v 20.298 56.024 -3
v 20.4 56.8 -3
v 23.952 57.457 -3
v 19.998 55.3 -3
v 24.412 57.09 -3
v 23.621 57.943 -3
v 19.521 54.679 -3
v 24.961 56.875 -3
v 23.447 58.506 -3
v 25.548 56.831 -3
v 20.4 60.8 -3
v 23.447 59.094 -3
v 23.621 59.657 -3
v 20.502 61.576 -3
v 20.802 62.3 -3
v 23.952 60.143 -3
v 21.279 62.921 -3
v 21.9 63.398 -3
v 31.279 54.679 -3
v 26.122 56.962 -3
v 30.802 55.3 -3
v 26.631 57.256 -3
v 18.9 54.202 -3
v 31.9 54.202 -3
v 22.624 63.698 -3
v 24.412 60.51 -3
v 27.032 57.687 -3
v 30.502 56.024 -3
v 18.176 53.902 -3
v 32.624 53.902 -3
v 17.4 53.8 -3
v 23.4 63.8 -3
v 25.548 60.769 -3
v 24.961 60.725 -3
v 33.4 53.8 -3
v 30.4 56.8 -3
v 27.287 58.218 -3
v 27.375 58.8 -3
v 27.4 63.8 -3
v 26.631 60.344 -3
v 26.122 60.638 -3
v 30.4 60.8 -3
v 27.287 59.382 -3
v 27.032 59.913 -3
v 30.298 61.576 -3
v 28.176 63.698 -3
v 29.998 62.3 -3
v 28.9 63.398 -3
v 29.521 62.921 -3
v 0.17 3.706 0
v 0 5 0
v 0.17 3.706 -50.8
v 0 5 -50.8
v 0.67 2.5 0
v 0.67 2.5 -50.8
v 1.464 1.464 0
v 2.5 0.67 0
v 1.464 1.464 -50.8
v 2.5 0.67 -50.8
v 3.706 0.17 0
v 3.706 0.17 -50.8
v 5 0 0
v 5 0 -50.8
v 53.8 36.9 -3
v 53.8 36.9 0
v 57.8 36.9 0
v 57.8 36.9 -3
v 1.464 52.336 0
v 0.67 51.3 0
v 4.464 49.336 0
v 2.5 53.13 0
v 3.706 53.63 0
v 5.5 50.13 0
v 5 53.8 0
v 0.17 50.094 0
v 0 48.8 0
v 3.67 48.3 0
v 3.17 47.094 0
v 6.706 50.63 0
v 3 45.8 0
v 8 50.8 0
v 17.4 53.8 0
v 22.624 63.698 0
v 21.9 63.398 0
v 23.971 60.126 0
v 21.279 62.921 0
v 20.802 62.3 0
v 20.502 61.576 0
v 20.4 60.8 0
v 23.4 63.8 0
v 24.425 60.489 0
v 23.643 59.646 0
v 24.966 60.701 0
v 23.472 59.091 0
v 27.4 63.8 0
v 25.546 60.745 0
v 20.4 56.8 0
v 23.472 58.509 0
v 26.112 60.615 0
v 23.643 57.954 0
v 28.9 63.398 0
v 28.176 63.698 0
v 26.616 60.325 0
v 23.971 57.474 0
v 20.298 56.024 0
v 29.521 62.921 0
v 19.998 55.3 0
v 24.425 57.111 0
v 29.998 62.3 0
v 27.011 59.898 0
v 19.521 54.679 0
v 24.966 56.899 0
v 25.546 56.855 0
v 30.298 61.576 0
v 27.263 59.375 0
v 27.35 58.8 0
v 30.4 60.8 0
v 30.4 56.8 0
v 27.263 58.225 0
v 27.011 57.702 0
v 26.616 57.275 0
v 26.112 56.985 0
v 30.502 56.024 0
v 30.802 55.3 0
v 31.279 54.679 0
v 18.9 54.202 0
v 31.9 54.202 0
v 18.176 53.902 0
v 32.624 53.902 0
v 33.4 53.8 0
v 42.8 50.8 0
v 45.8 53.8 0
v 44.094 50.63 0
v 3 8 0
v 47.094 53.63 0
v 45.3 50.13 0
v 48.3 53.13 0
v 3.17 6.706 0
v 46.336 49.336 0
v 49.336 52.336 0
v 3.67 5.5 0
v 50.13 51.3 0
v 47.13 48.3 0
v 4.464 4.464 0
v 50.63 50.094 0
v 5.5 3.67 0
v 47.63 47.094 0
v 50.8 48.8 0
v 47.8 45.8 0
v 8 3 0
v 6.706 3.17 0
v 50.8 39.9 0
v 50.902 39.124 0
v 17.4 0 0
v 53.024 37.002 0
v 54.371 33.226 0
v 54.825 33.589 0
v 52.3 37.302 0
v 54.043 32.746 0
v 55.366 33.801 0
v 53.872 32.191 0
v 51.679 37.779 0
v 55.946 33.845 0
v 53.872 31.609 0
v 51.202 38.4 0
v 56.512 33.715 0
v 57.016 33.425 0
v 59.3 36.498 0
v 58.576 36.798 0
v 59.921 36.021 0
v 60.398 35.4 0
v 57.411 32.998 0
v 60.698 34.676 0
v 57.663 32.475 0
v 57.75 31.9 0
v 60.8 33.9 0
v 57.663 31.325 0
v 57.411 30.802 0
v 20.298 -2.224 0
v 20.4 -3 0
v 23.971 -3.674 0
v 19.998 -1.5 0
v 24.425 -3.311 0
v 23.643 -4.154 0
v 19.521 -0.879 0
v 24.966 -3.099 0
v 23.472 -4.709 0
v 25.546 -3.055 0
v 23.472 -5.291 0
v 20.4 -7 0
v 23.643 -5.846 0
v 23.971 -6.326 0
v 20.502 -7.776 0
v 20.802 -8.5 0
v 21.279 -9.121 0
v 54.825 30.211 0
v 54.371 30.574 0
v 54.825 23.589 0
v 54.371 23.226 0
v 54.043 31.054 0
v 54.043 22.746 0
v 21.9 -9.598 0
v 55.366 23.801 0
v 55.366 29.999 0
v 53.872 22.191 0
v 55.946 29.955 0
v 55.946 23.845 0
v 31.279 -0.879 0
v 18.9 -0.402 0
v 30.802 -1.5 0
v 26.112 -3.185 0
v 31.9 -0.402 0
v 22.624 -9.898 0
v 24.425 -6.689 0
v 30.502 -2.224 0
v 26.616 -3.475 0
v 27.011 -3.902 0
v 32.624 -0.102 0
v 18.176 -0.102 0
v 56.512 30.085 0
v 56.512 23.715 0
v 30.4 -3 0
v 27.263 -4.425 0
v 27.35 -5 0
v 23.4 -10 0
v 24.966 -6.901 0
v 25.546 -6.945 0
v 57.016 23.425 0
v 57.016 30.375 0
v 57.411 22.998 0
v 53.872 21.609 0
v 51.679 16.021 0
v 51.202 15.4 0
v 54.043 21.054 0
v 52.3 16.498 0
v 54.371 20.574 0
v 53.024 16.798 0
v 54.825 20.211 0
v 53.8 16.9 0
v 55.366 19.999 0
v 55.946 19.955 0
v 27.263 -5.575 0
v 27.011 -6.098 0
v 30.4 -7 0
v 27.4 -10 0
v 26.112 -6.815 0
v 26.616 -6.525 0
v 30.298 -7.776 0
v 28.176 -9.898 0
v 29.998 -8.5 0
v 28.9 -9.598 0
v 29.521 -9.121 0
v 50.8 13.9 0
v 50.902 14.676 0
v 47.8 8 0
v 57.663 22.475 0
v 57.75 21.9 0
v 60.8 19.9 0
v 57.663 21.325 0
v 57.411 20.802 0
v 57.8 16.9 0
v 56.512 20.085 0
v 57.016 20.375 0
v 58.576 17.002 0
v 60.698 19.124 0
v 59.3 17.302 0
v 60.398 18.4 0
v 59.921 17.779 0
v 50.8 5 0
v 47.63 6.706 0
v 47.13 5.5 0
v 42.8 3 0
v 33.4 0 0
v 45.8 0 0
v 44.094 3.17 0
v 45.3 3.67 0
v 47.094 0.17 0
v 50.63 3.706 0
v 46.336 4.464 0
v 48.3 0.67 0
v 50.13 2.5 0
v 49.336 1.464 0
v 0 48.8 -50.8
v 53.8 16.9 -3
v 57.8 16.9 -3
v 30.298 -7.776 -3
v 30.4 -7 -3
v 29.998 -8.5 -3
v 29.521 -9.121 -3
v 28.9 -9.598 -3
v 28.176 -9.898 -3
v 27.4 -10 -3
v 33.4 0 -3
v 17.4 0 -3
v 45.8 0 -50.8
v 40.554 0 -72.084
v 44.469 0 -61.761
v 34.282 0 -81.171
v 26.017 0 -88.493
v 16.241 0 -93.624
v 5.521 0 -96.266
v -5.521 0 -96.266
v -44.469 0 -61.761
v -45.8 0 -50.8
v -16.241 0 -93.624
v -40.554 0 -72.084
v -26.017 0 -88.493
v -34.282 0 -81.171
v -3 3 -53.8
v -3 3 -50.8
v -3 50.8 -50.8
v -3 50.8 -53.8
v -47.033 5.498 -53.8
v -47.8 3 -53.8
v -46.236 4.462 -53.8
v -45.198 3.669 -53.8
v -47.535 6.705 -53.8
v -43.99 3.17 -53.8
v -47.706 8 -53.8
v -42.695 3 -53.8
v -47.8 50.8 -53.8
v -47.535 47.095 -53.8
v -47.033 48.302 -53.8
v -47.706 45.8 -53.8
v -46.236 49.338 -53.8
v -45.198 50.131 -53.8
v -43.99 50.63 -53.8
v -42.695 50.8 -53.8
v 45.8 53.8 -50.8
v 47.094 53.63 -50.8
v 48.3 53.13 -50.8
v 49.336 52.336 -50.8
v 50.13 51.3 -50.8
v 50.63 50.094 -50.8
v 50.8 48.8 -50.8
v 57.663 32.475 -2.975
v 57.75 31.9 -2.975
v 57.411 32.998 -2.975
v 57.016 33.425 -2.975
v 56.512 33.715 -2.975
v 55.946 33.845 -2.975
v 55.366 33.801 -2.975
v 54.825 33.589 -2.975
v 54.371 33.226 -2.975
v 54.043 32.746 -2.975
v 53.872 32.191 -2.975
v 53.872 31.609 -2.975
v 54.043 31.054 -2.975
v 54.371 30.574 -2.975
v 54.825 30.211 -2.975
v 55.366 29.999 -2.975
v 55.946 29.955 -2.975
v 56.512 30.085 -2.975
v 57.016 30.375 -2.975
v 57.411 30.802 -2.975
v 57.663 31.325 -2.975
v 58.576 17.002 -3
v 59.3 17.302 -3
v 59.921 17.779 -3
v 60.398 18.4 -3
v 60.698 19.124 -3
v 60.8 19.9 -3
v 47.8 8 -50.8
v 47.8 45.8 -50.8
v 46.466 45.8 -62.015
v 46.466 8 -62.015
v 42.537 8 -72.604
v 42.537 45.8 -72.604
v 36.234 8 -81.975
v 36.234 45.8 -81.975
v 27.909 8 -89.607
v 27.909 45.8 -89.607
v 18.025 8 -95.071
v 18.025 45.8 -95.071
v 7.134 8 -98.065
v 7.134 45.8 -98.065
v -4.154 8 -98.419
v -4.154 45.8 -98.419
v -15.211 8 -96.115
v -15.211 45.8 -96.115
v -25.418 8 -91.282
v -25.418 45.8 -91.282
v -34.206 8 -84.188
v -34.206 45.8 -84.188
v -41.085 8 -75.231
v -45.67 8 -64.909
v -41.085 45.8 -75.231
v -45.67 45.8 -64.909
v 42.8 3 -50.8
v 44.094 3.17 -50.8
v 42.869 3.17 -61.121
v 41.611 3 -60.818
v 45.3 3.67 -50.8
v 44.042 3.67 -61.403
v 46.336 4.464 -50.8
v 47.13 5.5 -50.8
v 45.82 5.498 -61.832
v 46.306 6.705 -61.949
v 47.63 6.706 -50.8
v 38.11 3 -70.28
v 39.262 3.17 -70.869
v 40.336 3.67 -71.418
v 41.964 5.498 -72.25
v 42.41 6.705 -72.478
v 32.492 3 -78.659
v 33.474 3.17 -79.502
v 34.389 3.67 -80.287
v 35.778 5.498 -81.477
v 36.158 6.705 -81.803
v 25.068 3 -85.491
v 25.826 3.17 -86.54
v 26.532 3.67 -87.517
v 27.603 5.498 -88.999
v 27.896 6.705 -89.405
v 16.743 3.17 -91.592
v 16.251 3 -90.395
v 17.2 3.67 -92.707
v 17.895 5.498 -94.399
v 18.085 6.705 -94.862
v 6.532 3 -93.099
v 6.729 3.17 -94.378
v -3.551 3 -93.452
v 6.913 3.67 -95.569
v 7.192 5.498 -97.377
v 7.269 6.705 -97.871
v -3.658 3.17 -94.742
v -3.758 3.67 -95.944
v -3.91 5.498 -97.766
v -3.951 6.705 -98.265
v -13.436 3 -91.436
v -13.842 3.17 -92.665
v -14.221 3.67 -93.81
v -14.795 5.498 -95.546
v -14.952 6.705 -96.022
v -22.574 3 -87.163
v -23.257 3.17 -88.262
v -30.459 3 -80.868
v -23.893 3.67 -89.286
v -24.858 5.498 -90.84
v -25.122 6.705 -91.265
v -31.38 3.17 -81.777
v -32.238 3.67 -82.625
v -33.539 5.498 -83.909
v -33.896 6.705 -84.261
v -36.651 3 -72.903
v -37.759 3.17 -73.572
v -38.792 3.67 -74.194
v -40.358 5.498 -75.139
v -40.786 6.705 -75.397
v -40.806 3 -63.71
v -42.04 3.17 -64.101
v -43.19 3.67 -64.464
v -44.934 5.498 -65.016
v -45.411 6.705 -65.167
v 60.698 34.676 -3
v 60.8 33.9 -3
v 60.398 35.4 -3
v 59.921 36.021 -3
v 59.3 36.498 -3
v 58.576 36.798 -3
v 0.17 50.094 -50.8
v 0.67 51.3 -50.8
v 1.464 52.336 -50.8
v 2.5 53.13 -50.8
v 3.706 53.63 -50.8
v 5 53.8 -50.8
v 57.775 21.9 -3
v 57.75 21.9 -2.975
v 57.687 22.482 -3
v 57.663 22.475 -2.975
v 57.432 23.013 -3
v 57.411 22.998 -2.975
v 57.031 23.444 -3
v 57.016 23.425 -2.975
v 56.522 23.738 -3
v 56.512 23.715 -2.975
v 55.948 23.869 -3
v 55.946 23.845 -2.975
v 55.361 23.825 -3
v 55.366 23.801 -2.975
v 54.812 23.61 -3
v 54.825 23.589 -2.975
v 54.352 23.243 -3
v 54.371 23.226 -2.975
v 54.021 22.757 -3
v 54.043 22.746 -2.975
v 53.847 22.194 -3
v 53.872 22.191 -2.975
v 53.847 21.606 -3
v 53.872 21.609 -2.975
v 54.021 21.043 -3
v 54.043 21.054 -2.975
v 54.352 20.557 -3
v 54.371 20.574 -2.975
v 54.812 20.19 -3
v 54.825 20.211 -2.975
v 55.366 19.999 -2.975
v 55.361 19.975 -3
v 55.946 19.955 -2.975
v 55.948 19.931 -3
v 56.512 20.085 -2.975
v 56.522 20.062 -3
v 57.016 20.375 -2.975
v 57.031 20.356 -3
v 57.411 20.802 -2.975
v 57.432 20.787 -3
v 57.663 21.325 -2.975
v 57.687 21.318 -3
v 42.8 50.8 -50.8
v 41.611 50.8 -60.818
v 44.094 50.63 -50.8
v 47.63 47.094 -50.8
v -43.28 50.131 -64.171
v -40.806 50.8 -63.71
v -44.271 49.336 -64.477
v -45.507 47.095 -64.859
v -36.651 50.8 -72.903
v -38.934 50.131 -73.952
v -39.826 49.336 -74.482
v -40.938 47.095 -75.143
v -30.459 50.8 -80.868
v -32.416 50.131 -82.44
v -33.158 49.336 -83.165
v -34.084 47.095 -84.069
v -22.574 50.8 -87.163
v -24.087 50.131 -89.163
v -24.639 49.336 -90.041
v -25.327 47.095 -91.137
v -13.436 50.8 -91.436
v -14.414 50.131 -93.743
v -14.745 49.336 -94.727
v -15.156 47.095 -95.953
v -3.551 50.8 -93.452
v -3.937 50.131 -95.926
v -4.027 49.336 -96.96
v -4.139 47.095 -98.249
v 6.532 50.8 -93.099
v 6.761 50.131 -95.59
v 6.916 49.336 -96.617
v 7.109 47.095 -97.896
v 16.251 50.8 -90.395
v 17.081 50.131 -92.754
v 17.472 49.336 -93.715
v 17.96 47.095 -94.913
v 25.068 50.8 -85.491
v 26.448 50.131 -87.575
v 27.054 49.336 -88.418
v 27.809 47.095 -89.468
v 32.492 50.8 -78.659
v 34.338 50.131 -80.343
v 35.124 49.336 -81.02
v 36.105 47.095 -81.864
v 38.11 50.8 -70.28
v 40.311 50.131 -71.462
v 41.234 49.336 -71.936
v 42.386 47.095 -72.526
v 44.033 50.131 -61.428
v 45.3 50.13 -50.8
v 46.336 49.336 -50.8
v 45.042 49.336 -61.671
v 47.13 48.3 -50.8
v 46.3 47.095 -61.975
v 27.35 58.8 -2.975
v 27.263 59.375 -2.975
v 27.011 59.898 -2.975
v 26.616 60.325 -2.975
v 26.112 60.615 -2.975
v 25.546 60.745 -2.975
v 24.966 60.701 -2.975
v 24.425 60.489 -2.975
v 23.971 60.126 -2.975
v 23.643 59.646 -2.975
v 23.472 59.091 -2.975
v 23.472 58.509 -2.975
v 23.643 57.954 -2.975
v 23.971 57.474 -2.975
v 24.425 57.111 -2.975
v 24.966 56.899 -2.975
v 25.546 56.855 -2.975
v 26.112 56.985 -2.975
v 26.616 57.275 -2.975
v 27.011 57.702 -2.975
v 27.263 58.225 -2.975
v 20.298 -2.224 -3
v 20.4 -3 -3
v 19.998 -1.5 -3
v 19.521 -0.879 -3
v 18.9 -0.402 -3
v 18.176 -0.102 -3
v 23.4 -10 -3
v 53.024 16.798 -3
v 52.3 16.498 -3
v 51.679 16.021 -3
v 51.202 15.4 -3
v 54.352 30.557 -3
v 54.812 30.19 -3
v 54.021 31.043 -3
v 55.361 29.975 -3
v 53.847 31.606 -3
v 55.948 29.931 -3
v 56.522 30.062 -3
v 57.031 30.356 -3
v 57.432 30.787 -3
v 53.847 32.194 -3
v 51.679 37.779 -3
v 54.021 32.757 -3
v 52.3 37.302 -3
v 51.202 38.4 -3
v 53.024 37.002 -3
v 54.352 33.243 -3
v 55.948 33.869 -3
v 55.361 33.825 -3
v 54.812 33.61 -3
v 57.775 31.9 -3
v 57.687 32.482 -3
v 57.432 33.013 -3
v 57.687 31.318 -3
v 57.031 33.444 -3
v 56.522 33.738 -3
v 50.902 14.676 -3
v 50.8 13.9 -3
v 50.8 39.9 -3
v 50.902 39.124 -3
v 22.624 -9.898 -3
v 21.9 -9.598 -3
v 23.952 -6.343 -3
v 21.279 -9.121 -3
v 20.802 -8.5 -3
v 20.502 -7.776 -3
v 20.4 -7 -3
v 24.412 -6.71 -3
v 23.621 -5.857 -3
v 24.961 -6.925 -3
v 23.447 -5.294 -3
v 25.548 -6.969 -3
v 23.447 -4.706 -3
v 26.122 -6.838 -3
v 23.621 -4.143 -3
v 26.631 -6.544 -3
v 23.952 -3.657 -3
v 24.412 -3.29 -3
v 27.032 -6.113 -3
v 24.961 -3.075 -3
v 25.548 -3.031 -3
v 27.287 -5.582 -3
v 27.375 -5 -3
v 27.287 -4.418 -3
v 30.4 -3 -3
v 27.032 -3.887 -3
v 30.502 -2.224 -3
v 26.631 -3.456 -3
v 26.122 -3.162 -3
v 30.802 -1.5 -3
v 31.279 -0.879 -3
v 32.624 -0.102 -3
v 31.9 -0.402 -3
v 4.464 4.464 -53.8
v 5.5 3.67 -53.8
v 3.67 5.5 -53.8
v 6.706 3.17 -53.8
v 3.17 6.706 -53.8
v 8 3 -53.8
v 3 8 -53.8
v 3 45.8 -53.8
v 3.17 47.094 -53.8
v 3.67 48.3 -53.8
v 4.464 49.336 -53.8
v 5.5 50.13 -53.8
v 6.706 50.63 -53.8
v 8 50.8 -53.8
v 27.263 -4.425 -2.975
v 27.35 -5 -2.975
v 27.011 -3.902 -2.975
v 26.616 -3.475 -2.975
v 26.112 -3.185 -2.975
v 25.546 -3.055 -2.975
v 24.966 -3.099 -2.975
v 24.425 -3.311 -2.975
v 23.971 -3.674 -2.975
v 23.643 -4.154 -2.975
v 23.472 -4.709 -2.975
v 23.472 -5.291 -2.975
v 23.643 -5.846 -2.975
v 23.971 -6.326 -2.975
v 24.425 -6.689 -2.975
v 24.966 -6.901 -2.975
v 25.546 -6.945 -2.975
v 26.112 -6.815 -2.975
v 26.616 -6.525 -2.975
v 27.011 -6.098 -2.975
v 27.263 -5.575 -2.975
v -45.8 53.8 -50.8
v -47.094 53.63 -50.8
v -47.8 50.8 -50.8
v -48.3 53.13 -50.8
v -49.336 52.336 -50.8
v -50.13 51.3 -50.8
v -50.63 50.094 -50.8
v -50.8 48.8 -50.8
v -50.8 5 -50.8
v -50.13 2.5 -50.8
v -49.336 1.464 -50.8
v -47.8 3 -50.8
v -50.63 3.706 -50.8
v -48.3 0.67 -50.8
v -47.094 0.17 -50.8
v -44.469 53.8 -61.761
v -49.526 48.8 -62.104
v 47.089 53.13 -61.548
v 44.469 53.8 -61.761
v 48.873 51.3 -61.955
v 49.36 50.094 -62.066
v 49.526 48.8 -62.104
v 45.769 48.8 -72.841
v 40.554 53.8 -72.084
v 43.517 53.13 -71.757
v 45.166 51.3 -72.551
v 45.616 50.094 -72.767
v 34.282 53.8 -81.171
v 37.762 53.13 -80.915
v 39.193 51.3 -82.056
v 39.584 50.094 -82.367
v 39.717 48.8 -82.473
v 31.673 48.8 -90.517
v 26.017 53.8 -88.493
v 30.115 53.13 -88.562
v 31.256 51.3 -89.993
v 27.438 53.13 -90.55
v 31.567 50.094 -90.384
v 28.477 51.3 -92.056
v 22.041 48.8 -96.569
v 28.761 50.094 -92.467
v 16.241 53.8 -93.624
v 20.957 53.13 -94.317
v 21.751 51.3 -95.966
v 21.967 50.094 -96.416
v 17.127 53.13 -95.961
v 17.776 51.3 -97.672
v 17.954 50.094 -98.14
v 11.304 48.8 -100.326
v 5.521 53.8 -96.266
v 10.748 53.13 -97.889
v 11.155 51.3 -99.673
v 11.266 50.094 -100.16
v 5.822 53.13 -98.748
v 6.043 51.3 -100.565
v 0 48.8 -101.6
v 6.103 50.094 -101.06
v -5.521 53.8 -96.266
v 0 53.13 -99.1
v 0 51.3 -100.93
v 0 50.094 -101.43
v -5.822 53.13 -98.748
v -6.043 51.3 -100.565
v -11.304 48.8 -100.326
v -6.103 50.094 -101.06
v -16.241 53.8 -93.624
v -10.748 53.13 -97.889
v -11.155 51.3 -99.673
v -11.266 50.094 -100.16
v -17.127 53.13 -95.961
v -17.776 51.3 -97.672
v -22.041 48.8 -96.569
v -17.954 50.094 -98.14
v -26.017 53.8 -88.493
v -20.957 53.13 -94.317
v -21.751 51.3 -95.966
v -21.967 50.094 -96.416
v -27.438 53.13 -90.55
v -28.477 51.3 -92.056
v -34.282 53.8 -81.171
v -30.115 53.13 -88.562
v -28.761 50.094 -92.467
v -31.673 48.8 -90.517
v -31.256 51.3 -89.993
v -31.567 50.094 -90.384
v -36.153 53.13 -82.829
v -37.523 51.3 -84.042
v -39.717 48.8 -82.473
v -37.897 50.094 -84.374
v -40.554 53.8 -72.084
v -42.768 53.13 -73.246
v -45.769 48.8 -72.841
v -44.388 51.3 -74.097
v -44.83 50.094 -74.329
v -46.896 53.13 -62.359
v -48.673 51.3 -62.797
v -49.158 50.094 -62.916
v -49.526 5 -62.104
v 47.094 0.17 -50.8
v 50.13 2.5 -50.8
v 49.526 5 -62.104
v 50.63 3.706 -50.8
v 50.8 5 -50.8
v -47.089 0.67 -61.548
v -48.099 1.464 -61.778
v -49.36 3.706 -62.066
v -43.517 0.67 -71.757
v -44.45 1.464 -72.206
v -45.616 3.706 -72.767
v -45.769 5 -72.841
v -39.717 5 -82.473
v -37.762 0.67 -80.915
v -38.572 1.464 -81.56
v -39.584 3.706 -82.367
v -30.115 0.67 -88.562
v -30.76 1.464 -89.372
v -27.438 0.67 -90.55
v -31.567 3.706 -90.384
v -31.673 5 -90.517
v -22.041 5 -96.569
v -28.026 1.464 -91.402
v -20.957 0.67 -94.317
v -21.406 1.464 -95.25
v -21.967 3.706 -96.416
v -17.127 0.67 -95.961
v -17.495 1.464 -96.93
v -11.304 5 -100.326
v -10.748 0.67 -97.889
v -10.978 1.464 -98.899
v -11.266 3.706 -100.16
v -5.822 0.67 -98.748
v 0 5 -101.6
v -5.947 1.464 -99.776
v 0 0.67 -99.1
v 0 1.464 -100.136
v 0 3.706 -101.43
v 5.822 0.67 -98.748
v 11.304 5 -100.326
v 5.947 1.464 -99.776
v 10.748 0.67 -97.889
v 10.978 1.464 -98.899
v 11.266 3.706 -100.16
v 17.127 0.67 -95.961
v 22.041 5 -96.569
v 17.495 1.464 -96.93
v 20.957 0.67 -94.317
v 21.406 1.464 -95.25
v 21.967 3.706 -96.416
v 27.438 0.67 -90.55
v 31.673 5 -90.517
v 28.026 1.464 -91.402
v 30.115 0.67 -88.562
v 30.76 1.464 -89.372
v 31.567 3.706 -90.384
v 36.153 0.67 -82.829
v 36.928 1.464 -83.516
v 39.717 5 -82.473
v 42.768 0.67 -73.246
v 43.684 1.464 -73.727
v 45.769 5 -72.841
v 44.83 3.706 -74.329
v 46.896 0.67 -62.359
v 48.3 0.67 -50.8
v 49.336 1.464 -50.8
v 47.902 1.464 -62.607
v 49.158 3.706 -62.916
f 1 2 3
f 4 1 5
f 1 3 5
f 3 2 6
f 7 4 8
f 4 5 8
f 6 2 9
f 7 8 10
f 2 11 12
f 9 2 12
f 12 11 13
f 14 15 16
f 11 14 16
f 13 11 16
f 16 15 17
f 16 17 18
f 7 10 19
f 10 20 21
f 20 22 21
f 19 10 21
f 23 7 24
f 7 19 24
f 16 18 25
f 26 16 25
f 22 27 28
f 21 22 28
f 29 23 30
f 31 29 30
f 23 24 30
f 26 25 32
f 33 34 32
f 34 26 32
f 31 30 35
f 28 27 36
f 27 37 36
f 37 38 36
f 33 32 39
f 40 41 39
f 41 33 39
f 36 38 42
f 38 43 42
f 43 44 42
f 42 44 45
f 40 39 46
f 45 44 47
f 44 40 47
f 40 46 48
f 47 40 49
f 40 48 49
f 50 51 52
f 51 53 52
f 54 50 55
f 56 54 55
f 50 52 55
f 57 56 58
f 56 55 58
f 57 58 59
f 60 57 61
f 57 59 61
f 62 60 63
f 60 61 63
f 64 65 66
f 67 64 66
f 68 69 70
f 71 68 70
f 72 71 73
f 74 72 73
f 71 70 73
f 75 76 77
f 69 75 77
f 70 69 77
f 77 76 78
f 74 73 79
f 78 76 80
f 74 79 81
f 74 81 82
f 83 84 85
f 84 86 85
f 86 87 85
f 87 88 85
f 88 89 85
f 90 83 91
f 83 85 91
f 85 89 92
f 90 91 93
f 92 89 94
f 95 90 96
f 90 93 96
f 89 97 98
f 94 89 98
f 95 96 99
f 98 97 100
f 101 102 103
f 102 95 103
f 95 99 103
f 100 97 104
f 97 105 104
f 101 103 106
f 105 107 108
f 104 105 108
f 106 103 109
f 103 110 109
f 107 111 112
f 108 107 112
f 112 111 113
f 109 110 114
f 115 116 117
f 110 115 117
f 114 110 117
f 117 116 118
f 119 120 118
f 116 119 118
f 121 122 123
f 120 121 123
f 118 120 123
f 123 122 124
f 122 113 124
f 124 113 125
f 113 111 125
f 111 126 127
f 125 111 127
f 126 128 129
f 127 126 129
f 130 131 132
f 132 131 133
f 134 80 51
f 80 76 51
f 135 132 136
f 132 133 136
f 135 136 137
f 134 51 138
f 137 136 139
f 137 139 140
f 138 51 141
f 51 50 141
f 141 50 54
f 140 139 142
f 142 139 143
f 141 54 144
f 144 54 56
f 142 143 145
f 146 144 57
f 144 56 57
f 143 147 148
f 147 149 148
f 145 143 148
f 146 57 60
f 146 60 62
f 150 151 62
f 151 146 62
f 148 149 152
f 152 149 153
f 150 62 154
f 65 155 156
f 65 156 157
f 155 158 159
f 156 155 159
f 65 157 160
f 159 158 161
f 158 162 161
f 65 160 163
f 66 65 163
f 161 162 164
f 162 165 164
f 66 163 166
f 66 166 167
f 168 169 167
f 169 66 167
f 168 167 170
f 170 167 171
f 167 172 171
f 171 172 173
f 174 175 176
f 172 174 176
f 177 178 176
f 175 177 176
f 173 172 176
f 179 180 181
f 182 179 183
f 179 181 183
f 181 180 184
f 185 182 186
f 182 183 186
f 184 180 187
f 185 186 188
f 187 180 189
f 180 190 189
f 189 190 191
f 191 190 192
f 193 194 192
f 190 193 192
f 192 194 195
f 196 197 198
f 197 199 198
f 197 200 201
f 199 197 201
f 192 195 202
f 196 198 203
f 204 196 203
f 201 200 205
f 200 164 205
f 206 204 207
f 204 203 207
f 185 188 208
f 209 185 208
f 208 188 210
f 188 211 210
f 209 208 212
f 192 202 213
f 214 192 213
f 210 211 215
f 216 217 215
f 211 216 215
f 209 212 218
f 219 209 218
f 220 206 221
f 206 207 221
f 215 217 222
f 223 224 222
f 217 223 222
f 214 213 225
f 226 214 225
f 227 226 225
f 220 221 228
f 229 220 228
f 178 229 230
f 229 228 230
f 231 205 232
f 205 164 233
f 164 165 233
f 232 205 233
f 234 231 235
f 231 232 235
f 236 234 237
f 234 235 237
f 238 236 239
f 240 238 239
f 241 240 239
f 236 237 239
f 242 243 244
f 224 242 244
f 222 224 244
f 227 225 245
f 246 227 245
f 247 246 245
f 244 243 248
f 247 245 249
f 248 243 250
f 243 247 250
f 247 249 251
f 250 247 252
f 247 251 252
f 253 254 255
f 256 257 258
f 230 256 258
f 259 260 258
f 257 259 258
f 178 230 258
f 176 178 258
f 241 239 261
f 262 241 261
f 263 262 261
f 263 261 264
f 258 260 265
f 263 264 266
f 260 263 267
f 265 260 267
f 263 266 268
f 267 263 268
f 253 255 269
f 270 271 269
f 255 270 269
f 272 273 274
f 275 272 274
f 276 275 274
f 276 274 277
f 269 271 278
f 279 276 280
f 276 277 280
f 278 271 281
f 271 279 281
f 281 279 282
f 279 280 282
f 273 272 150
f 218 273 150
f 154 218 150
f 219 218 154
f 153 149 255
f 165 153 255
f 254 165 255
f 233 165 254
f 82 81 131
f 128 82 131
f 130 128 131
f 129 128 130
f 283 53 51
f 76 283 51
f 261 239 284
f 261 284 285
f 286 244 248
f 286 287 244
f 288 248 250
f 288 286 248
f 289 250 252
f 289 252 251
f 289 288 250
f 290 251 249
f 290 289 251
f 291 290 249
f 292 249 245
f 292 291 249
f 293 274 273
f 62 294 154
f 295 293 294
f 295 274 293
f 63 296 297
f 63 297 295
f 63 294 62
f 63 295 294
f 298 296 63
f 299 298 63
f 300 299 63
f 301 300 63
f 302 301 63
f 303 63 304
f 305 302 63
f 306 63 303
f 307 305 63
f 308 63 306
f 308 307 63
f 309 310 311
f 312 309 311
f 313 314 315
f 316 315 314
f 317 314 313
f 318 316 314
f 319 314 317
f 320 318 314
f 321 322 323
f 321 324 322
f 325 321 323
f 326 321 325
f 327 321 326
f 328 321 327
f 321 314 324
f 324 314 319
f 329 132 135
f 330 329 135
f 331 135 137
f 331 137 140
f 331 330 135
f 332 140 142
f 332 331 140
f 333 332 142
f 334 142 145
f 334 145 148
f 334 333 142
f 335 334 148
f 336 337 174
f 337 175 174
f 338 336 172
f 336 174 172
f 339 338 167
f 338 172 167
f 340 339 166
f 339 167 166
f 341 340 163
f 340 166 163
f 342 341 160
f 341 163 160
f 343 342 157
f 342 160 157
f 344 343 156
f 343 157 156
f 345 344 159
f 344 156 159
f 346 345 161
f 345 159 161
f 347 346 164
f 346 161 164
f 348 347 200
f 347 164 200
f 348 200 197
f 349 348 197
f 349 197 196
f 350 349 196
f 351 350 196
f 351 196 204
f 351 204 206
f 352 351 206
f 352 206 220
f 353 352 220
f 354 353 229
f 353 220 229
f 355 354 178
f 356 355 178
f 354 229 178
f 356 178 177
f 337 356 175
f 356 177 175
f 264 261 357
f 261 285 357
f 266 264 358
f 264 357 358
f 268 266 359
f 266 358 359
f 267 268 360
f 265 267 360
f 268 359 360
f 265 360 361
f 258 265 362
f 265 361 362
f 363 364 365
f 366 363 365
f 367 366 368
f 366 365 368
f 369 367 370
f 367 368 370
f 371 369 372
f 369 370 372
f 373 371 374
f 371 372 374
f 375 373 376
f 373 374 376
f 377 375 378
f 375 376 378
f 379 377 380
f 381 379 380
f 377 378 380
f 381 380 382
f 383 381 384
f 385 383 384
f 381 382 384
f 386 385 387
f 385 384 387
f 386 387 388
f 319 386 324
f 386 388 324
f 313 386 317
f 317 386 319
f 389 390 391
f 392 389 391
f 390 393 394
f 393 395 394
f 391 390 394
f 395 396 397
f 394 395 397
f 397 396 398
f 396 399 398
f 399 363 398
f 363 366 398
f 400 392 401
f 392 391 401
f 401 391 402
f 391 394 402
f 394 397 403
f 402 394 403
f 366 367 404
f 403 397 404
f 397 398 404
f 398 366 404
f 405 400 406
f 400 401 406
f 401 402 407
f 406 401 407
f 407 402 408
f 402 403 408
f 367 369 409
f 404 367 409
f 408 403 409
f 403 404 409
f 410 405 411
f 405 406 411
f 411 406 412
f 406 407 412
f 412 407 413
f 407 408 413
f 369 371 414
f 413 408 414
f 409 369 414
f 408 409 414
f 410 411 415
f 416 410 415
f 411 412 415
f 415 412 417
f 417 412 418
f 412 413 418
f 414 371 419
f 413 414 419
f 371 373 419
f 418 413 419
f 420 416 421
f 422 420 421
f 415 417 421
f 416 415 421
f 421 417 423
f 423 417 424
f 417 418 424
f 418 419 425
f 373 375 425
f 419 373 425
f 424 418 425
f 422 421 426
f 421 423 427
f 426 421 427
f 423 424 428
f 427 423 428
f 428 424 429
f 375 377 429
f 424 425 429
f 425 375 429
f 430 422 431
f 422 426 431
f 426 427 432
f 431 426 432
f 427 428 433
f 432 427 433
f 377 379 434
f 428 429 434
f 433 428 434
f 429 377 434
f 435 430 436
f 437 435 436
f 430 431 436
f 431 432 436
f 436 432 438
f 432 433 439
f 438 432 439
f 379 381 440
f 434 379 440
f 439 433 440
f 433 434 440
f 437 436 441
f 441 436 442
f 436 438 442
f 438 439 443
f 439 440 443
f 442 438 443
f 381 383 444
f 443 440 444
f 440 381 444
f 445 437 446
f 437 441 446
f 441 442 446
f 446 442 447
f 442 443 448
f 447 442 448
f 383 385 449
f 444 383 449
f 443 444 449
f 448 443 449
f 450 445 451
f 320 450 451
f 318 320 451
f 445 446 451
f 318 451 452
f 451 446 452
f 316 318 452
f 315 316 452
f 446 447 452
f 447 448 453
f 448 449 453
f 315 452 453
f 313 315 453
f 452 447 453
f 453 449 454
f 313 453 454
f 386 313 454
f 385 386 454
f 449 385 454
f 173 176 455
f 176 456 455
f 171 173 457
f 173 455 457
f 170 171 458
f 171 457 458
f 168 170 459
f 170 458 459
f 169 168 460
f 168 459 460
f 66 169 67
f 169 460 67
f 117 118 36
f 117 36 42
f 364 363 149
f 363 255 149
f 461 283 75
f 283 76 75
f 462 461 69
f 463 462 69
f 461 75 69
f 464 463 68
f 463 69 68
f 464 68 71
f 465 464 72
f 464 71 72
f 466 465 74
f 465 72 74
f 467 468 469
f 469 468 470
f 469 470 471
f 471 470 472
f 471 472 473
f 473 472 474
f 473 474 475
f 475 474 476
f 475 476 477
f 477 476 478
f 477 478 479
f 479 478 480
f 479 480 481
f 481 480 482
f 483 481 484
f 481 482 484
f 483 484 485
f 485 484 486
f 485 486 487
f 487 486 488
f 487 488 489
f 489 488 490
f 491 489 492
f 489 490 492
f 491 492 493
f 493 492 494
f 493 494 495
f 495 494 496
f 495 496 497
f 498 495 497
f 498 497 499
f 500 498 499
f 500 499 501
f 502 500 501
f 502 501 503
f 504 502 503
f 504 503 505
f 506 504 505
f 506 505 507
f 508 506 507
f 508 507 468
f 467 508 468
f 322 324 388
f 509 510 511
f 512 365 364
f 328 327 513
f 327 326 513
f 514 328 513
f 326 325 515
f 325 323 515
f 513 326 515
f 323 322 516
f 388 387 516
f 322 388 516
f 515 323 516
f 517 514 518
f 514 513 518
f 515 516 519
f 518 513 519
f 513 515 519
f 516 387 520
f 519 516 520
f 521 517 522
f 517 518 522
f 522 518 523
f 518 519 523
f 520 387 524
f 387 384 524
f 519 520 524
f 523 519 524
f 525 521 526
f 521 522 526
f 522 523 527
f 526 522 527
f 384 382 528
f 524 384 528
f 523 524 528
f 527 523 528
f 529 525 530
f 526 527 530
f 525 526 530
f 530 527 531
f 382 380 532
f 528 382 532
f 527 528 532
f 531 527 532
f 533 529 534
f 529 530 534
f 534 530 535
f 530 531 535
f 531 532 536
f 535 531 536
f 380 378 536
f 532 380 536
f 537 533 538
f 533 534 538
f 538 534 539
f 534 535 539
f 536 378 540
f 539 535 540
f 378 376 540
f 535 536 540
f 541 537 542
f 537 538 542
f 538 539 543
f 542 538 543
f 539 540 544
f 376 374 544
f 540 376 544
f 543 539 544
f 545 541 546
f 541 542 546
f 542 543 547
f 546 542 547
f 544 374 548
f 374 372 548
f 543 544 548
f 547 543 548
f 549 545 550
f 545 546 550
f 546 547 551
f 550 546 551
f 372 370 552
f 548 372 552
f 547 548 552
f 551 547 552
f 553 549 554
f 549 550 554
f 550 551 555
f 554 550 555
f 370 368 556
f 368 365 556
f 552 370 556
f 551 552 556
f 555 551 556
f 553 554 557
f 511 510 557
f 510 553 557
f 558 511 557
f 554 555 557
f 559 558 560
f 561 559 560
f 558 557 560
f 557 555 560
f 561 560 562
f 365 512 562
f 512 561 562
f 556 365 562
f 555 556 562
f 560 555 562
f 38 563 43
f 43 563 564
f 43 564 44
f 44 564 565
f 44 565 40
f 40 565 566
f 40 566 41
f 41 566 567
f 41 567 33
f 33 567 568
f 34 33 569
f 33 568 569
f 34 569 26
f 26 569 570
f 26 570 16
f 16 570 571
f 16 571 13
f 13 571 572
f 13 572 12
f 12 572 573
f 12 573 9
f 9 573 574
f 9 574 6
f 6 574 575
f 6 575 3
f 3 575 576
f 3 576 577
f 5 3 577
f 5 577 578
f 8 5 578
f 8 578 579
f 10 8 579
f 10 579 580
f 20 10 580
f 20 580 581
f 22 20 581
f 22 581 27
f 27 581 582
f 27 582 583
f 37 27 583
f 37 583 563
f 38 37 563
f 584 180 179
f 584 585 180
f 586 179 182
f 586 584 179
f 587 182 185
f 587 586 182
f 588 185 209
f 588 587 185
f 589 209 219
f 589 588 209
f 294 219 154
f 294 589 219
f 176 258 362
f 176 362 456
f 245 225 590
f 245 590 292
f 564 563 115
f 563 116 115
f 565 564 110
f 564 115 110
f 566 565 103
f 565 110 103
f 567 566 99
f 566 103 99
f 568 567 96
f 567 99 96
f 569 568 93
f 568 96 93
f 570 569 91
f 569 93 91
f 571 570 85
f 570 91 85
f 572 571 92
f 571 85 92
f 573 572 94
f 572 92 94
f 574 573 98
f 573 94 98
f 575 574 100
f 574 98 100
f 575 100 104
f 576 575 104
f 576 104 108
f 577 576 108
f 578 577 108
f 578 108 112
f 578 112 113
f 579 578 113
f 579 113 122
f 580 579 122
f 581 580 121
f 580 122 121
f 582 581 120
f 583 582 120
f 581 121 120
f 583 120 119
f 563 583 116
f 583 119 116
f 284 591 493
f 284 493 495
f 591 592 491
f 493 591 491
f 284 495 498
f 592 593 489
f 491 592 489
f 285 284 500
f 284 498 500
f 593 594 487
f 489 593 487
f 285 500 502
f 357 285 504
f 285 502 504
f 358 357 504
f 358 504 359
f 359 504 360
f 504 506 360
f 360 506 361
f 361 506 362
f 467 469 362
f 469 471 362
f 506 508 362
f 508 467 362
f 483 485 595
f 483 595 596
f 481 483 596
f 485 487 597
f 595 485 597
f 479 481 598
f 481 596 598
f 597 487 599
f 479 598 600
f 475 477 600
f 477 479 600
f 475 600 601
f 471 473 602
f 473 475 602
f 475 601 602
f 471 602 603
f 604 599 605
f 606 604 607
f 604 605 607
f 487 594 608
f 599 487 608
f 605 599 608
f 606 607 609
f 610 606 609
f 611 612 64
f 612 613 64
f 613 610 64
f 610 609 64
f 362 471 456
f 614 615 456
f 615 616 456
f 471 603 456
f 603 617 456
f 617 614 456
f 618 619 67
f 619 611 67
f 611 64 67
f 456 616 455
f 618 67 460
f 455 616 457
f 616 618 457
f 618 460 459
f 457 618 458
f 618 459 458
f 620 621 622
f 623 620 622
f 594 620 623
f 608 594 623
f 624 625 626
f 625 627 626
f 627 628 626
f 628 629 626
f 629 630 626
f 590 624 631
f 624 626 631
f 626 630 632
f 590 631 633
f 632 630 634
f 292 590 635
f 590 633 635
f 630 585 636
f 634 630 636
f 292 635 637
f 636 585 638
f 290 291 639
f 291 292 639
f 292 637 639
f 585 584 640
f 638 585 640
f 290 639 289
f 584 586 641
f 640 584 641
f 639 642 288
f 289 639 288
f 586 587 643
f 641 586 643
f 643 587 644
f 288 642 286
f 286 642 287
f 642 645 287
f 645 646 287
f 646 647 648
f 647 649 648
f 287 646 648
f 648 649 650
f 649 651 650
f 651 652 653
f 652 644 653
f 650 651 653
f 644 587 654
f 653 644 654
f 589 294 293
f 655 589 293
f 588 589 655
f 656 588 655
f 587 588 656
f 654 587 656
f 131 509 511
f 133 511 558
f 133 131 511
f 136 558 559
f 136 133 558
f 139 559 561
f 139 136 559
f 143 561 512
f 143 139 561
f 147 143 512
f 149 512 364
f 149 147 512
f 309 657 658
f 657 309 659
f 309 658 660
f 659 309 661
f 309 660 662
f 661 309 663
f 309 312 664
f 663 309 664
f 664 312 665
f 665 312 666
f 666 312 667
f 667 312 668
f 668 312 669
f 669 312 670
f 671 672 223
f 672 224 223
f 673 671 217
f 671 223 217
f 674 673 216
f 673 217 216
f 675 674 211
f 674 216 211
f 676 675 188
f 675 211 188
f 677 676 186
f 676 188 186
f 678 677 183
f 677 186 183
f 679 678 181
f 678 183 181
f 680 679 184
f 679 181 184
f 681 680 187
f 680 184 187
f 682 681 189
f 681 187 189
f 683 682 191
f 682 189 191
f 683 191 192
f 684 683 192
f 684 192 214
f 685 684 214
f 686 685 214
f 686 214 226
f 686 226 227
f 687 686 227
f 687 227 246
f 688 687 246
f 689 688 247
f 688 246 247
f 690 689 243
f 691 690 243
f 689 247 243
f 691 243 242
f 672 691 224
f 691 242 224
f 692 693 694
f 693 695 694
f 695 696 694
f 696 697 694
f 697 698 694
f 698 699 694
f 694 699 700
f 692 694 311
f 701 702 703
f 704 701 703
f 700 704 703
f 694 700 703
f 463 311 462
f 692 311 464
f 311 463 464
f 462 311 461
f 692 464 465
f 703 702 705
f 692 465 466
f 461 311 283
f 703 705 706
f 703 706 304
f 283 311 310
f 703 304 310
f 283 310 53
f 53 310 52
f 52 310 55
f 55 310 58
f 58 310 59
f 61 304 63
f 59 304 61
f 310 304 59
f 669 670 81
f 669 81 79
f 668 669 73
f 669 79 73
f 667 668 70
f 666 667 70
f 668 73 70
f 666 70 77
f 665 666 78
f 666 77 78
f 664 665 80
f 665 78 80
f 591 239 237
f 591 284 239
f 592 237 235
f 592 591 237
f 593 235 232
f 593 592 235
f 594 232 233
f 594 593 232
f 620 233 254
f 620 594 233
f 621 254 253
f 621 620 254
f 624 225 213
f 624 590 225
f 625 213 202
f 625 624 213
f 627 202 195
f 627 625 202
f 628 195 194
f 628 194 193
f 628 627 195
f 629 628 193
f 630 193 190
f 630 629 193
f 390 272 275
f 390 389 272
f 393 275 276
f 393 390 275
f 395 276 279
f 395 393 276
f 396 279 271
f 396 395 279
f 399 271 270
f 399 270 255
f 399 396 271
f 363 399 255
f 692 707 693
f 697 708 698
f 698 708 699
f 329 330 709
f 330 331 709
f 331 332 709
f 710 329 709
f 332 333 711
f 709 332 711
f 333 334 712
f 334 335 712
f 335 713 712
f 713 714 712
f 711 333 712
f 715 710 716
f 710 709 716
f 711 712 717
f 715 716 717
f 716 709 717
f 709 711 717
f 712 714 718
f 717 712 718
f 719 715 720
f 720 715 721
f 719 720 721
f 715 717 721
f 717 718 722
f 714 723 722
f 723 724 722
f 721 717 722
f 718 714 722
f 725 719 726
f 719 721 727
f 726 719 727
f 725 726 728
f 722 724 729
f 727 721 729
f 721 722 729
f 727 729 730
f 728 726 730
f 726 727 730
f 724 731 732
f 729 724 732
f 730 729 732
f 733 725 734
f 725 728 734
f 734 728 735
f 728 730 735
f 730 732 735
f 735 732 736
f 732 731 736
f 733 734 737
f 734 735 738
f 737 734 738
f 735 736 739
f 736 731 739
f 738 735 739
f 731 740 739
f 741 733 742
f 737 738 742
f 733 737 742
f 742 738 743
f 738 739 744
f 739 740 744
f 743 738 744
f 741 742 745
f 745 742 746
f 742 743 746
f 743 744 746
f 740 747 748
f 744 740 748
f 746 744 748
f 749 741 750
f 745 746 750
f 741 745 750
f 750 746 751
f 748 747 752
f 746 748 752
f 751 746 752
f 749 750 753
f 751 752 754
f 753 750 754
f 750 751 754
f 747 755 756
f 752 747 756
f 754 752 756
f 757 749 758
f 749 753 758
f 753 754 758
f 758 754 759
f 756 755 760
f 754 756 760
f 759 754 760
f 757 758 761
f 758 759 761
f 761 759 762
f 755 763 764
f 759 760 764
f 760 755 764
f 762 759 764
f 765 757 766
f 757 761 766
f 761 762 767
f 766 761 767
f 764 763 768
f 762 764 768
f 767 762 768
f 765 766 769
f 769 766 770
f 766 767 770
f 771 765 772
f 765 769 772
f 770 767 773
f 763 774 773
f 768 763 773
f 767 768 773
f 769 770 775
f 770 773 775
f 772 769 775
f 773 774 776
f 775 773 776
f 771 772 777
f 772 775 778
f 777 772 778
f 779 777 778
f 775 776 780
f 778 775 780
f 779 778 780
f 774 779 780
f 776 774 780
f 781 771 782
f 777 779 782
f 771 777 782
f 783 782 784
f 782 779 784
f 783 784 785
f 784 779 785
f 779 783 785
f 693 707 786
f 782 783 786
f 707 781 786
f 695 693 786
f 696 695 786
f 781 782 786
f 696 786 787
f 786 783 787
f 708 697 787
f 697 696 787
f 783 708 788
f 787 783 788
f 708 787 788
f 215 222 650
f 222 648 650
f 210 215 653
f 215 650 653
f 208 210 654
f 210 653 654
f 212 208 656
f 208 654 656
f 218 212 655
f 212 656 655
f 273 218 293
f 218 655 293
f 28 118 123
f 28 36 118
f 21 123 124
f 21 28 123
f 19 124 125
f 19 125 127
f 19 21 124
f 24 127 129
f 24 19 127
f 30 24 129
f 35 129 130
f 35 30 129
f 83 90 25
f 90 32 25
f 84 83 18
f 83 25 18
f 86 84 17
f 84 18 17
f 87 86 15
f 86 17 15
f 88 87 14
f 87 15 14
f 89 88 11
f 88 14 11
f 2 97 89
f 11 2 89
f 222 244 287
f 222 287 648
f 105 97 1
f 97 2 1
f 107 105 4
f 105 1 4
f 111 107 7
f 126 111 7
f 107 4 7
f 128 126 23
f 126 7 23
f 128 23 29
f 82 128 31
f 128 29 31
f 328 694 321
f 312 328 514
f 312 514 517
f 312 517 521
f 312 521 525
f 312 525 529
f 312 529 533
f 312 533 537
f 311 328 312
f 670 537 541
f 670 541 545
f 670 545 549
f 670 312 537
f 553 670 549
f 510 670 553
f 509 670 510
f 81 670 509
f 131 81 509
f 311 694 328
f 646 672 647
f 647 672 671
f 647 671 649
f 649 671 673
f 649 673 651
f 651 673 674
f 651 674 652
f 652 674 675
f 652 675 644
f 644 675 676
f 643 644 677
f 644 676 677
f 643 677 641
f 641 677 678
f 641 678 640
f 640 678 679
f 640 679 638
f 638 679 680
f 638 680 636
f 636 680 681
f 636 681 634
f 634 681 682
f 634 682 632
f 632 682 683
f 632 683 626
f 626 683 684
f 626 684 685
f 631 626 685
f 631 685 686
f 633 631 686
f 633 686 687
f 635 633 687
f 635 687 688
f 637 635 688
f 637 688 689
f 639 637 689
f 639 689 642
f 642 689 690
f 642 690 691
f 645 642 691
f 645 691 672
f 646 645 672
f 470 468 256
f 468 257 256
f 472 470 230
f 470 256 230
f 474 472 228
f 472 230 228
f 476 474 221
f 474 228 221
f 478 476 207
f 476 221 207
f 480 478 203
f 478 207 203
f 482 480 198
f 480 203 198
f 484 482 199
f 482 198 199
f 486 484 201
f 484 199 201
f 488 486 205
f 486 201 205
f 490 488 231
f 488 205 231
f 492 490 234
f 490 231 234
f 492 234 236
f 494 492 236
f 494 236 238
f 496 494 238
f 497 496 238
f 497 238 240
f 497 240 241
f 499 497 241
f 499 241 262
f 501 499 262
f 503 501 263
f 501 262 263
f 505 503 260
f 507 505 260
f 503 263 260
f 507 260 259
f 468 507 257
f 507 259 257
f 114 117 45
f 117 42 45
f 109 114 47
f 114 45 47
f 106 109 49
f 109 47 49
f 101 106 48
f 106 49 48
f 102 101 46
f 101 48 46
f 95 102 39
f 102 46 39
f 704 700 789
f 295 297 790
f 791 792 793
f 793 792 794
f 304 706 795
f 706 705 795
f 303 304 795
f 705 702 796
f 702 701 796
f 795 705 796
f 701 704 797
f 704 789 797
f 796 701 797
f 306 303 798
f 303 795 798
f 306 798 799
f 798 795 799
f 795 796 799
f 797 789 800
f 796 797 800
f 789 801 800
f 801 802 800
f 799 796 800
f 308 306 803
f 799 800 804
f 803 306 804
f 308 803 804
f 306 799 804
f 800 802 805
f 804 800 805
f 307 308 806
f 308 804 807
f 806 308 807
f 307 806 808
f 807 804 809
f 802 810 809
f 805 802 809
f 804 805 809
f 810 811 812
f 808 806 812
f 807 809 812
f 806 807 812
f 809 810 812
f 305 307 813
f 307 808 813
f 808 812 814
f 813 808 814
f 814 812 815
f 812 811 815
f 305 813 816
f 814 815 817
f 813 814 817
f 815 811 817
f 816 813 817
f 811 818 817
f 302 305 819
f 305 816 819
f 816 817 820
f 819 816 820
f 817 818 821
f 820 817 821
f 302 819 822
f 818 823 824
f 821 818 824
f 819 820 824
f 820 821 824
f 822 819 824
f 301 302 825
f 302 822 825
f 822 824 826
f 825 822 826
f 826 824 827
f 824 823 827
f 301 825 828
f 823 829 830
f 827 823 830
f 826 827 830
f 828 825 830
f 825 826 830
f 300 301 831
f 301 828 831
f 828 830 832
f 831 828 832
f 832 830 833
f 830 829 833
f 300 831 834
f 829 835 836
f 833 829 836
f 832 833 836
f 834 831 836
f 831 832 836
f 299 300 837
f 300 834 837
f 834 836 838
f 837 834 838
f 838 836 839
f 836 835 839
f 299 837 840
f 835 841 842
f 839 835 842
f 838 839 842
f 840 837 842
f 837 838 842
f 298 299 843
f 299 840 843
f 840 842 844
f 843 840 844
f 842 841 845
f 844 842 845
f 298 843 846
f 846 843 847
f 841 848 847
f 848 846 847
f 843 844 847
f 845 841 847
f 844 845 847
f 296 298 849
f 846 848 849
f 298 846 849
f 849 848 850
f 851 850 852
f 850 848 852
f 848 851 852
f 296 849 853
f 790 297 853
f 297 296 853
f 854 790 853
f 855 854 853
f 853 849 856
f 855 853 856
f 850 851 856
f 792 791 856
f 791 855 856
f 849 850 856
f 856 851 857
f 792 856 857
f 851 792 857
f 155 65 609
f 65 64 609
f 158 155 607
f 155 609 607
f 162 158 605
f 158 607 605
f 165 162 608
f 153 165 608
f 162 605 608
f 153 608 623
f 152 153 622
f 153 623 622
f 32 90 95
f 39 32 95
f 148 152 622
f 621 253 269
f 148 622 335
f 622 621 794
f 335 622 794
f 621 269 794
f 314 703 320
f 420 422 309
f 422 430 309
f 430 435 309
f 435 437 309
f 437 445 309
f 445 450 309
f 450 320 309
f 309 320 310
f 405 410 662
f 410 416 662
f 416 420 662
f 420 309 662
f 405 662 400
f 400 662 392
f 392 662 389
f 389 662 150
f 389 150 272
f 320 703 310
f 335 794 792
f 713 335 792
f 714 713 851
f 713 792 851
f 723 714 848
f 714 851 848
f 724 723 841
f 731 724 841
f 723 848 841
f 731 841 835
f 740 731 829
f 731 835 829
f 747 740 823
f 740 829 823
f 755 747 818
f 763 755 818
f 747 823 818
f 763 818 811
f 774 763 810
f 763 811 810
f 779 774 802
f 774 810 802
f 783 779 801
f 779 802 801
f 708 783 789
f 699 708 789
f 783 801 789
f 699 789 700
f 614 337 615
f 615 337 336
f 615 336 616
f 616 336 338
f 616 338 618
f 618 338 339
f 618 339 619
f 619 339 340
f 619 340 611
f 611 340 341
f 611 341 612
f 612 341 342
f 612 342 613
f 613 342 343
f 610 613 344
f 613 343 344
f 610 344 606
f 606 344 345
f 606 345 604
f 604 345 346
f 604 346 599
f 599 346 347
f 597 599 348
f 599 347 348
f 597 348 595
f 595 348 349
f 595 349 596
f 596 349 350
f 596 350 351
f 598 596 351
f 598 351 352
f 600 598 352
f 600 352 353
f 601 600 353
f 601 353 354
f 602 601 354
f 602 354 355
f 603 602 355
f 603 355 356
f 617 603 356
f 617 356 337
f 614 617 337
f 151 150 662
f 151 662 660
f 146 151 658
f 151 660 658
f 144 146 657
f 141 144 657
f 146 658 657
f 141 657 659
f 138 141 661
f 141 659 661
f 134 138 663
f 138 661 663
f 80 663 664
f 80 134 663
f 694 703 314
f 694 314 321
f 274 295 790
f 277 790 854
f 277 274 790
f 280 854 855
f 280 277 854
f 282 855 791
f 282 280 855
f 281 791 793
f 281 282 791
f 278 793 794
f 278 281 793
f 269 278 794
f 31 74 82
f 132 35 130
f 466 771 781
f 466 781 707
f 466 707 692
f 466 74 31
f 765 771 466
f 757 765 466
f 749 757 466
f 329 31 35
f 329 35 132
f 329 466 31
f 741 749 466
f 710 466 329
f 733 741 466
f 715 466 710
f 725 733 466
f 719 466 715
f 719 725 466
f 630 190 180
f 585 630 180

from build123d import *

# Parameters (mm, degrees)
BOSS_EXTRUDE1_DEPTH              = 50.8
CUT_EXTRUDE1_DEPTH               = 47.8
BOSS_EXTRUDE2_DEPTH              = 3
SKETCH4_W                        = 44.8
SKETCH4_H                        = 47.8
CUT_EXTRUDE2_DEPTH               = 3
SKETCH5_W                        = 44.8
SKETCH5_H                        = 47.8
CUT_EXTRUDE3_DEPTH               = 3
SKETCH6_W                        = 10
SKETCH6_H                        = 10
SKETCH6_H_2                      = 20
BOSS_EXTRUDE3_DEPTH              = 3
FILLET1_R                        = 5
FILLET2_R                        = 3
M3_5_CLEARANCE_HOLE2_D           = 3.9
M3_5_CLEARANCE_HOLE2_CSINK_D     = 3.95
M3_5_CLEARANCE_HOLE2_CSINK_ANGLE = 90


with BuildPart() as part:
    # Sketch1 → Boss-Extrude1 (new body)
    with BuildSketch(Plane(origin=(0, 0, 0), x_dir=(1, 0, 0), z_dir=(0, 1, 0))):
        with BuildLine():
            Line((0, 0), (0, 50.8))
            Line((0, 50.8), (-50.8, 50.8))
            ThreePointArc((-50.8, 50.8), (0, 101.6), (50.8, 50.8))
            Line((50.8, 50.8), (50.8, 0))
            Line((50.8, 0), (0, 0))
        make_face()
    extrude(amount=BOSS_EXTRUDE1_DEPTH)

    # Sketch2 → Cut-Extrude1 (cut)
    with BuildSketch(Plane(origin=(0, 50.8, 0), x_dir=(1, 0, 0), z_dir=(0, 1, 0))):
        with BuildLine():
            Line((3, 3), (47.8, 3))
            Line((47.8, 3), (47.8, 50.8))
            ThreePointArc((47.8, 50.8), (1.500739839, 98.576435404), (-47.705764851, 53.8))
            Line((-47.705764851, 53.8), (3, 53.8))
            Line((3, 53.8), (3, 3))
        make_face()
    extrude(amount=-CUT_EXTRUDE1_DEPTH, mode=Mode.SUBTRACT)

    # Sketch3 → Boss-Extrude2 (add)
    with BuildSketch(Plane(origin=(0, 50.8, 0), x_dir=(1, 0, 0), z_dir=(0, 1, 0))):
        with BuildLine():
            Line((0, 50.8), (0, 0))
            Line((0, 0), (50.8, 0))
            Line((50.8, 0), (50.8, 50.8))
            ThreePointArc((50.8, 50.8), (0, 101.6), (-50.8, 50.8))
            Line((-50.8, 50.8), (0, 50.8))
        make_face()
    extrude(amount=BOSS_EXTRUDE2_DEPTH)

    # Sketch4 → Cut-Extrude2 (cut)
    with BuildSketch(Plane.XY):
        with Locations((25.4, 26.9)):
            Rectangle(SKETCH4_W, SKETCH4_H)
    extrude(amount=-CUT_EXTRUDE2_DEPTH, mode=Mode.SUBTRACT)

    # Sketch5 → Cut-Extrude3 (cut)
    with BuildSketch(Plane.XY.offset(-50.8)):
        with Locations((-25.4, 26.9)):
            Rectangle(SKETCH5_W, SKETCH5_H)
    extrude(amount=-CUT_EXTRUDE3_DEPTH, mode=Mode.SUBTRACT)

    # Sketch6 → Boss-Extrude3 (add)
    with BuildSketch(Plane.XY):
        with Locations((25.4, 58.8)):
            Rectangle(SKETCH6_W, SKETCH6_H)
        with Locations((55.8, 26.9)):
            Rectangle(SKETCH6_W, SKETCH6_H_2)
        with Locations((25.4, -5)):
            Rectangle(SKETCH6_W, SKETCH6_H)
    extrude(amount=-BOSS_EXTRUDE3_DEPTH)

    # Fillet1
    fillet1_edges = [part.edges().sort_by_distance(p)[0] for p in [
        (3, 50.8, -26.9),
        (47.8, 50.8, -25.4),
        (1.500739839, 50.8, -98.576435404),
        (3, 3, -26.9),
        (1.500739839, 3, -98.576435404),
        (47.8, 3, -25.4),
        (0, 53.8, -25.4),
        (50.8, 53.8, -25.4),
        (0, 53.8, -101.6),
        (0, 0, -25.4),
        (0, 0, -101.6),
        (50.8, 0, -25.4),
    ]]
    fillet(fillet1_edges, radius=FILLET1_R)

    # Fillet2
    fillet2_edges = [part.edges().sort_by_distance(p)[0] for p in [
        (30.4, 0, -1.5),
        (30.4, -10, -1.5),
        (20.4, -10, -1.5),
        (20.4, 0, -1.5),
        (20.4, 53.8, -1.5),
        (20.4, 63.8, -1.5),
        (30.4, 63.8, -1.5),
        (30.4, 53.8, -1.5),
        (50.8, 16.9, -1.5),
        (50.8, 36.9, -1.5),
        (60.8, 36.9, -1.5),
        (60.8, 16.9, -1.5),
    ]]
    fillet(fillet2_edges, radius=FILLET2_R)

    # M3.5 Clearance Hole2 (through all)
    with Locations(Plane(origin=(0, 0, -3), x_dir=(-1, 0, 0), z_dir=(0, 0, -1))):
        with Locations((-55.8, 31.9), (-55.8, 21.9), (-25.4, 58.8), (-25.4, -5)):
            CounterSinkHole(M3_5_CLEARANCE_HOLE2_D / 2, M3_5_CLEARANCE_HOLE2_CSINK_D / 2, counter_sink_angle=M3_5_CLEARANCE_HOLE2_CSINK_ANGLE)


solid = part.part
